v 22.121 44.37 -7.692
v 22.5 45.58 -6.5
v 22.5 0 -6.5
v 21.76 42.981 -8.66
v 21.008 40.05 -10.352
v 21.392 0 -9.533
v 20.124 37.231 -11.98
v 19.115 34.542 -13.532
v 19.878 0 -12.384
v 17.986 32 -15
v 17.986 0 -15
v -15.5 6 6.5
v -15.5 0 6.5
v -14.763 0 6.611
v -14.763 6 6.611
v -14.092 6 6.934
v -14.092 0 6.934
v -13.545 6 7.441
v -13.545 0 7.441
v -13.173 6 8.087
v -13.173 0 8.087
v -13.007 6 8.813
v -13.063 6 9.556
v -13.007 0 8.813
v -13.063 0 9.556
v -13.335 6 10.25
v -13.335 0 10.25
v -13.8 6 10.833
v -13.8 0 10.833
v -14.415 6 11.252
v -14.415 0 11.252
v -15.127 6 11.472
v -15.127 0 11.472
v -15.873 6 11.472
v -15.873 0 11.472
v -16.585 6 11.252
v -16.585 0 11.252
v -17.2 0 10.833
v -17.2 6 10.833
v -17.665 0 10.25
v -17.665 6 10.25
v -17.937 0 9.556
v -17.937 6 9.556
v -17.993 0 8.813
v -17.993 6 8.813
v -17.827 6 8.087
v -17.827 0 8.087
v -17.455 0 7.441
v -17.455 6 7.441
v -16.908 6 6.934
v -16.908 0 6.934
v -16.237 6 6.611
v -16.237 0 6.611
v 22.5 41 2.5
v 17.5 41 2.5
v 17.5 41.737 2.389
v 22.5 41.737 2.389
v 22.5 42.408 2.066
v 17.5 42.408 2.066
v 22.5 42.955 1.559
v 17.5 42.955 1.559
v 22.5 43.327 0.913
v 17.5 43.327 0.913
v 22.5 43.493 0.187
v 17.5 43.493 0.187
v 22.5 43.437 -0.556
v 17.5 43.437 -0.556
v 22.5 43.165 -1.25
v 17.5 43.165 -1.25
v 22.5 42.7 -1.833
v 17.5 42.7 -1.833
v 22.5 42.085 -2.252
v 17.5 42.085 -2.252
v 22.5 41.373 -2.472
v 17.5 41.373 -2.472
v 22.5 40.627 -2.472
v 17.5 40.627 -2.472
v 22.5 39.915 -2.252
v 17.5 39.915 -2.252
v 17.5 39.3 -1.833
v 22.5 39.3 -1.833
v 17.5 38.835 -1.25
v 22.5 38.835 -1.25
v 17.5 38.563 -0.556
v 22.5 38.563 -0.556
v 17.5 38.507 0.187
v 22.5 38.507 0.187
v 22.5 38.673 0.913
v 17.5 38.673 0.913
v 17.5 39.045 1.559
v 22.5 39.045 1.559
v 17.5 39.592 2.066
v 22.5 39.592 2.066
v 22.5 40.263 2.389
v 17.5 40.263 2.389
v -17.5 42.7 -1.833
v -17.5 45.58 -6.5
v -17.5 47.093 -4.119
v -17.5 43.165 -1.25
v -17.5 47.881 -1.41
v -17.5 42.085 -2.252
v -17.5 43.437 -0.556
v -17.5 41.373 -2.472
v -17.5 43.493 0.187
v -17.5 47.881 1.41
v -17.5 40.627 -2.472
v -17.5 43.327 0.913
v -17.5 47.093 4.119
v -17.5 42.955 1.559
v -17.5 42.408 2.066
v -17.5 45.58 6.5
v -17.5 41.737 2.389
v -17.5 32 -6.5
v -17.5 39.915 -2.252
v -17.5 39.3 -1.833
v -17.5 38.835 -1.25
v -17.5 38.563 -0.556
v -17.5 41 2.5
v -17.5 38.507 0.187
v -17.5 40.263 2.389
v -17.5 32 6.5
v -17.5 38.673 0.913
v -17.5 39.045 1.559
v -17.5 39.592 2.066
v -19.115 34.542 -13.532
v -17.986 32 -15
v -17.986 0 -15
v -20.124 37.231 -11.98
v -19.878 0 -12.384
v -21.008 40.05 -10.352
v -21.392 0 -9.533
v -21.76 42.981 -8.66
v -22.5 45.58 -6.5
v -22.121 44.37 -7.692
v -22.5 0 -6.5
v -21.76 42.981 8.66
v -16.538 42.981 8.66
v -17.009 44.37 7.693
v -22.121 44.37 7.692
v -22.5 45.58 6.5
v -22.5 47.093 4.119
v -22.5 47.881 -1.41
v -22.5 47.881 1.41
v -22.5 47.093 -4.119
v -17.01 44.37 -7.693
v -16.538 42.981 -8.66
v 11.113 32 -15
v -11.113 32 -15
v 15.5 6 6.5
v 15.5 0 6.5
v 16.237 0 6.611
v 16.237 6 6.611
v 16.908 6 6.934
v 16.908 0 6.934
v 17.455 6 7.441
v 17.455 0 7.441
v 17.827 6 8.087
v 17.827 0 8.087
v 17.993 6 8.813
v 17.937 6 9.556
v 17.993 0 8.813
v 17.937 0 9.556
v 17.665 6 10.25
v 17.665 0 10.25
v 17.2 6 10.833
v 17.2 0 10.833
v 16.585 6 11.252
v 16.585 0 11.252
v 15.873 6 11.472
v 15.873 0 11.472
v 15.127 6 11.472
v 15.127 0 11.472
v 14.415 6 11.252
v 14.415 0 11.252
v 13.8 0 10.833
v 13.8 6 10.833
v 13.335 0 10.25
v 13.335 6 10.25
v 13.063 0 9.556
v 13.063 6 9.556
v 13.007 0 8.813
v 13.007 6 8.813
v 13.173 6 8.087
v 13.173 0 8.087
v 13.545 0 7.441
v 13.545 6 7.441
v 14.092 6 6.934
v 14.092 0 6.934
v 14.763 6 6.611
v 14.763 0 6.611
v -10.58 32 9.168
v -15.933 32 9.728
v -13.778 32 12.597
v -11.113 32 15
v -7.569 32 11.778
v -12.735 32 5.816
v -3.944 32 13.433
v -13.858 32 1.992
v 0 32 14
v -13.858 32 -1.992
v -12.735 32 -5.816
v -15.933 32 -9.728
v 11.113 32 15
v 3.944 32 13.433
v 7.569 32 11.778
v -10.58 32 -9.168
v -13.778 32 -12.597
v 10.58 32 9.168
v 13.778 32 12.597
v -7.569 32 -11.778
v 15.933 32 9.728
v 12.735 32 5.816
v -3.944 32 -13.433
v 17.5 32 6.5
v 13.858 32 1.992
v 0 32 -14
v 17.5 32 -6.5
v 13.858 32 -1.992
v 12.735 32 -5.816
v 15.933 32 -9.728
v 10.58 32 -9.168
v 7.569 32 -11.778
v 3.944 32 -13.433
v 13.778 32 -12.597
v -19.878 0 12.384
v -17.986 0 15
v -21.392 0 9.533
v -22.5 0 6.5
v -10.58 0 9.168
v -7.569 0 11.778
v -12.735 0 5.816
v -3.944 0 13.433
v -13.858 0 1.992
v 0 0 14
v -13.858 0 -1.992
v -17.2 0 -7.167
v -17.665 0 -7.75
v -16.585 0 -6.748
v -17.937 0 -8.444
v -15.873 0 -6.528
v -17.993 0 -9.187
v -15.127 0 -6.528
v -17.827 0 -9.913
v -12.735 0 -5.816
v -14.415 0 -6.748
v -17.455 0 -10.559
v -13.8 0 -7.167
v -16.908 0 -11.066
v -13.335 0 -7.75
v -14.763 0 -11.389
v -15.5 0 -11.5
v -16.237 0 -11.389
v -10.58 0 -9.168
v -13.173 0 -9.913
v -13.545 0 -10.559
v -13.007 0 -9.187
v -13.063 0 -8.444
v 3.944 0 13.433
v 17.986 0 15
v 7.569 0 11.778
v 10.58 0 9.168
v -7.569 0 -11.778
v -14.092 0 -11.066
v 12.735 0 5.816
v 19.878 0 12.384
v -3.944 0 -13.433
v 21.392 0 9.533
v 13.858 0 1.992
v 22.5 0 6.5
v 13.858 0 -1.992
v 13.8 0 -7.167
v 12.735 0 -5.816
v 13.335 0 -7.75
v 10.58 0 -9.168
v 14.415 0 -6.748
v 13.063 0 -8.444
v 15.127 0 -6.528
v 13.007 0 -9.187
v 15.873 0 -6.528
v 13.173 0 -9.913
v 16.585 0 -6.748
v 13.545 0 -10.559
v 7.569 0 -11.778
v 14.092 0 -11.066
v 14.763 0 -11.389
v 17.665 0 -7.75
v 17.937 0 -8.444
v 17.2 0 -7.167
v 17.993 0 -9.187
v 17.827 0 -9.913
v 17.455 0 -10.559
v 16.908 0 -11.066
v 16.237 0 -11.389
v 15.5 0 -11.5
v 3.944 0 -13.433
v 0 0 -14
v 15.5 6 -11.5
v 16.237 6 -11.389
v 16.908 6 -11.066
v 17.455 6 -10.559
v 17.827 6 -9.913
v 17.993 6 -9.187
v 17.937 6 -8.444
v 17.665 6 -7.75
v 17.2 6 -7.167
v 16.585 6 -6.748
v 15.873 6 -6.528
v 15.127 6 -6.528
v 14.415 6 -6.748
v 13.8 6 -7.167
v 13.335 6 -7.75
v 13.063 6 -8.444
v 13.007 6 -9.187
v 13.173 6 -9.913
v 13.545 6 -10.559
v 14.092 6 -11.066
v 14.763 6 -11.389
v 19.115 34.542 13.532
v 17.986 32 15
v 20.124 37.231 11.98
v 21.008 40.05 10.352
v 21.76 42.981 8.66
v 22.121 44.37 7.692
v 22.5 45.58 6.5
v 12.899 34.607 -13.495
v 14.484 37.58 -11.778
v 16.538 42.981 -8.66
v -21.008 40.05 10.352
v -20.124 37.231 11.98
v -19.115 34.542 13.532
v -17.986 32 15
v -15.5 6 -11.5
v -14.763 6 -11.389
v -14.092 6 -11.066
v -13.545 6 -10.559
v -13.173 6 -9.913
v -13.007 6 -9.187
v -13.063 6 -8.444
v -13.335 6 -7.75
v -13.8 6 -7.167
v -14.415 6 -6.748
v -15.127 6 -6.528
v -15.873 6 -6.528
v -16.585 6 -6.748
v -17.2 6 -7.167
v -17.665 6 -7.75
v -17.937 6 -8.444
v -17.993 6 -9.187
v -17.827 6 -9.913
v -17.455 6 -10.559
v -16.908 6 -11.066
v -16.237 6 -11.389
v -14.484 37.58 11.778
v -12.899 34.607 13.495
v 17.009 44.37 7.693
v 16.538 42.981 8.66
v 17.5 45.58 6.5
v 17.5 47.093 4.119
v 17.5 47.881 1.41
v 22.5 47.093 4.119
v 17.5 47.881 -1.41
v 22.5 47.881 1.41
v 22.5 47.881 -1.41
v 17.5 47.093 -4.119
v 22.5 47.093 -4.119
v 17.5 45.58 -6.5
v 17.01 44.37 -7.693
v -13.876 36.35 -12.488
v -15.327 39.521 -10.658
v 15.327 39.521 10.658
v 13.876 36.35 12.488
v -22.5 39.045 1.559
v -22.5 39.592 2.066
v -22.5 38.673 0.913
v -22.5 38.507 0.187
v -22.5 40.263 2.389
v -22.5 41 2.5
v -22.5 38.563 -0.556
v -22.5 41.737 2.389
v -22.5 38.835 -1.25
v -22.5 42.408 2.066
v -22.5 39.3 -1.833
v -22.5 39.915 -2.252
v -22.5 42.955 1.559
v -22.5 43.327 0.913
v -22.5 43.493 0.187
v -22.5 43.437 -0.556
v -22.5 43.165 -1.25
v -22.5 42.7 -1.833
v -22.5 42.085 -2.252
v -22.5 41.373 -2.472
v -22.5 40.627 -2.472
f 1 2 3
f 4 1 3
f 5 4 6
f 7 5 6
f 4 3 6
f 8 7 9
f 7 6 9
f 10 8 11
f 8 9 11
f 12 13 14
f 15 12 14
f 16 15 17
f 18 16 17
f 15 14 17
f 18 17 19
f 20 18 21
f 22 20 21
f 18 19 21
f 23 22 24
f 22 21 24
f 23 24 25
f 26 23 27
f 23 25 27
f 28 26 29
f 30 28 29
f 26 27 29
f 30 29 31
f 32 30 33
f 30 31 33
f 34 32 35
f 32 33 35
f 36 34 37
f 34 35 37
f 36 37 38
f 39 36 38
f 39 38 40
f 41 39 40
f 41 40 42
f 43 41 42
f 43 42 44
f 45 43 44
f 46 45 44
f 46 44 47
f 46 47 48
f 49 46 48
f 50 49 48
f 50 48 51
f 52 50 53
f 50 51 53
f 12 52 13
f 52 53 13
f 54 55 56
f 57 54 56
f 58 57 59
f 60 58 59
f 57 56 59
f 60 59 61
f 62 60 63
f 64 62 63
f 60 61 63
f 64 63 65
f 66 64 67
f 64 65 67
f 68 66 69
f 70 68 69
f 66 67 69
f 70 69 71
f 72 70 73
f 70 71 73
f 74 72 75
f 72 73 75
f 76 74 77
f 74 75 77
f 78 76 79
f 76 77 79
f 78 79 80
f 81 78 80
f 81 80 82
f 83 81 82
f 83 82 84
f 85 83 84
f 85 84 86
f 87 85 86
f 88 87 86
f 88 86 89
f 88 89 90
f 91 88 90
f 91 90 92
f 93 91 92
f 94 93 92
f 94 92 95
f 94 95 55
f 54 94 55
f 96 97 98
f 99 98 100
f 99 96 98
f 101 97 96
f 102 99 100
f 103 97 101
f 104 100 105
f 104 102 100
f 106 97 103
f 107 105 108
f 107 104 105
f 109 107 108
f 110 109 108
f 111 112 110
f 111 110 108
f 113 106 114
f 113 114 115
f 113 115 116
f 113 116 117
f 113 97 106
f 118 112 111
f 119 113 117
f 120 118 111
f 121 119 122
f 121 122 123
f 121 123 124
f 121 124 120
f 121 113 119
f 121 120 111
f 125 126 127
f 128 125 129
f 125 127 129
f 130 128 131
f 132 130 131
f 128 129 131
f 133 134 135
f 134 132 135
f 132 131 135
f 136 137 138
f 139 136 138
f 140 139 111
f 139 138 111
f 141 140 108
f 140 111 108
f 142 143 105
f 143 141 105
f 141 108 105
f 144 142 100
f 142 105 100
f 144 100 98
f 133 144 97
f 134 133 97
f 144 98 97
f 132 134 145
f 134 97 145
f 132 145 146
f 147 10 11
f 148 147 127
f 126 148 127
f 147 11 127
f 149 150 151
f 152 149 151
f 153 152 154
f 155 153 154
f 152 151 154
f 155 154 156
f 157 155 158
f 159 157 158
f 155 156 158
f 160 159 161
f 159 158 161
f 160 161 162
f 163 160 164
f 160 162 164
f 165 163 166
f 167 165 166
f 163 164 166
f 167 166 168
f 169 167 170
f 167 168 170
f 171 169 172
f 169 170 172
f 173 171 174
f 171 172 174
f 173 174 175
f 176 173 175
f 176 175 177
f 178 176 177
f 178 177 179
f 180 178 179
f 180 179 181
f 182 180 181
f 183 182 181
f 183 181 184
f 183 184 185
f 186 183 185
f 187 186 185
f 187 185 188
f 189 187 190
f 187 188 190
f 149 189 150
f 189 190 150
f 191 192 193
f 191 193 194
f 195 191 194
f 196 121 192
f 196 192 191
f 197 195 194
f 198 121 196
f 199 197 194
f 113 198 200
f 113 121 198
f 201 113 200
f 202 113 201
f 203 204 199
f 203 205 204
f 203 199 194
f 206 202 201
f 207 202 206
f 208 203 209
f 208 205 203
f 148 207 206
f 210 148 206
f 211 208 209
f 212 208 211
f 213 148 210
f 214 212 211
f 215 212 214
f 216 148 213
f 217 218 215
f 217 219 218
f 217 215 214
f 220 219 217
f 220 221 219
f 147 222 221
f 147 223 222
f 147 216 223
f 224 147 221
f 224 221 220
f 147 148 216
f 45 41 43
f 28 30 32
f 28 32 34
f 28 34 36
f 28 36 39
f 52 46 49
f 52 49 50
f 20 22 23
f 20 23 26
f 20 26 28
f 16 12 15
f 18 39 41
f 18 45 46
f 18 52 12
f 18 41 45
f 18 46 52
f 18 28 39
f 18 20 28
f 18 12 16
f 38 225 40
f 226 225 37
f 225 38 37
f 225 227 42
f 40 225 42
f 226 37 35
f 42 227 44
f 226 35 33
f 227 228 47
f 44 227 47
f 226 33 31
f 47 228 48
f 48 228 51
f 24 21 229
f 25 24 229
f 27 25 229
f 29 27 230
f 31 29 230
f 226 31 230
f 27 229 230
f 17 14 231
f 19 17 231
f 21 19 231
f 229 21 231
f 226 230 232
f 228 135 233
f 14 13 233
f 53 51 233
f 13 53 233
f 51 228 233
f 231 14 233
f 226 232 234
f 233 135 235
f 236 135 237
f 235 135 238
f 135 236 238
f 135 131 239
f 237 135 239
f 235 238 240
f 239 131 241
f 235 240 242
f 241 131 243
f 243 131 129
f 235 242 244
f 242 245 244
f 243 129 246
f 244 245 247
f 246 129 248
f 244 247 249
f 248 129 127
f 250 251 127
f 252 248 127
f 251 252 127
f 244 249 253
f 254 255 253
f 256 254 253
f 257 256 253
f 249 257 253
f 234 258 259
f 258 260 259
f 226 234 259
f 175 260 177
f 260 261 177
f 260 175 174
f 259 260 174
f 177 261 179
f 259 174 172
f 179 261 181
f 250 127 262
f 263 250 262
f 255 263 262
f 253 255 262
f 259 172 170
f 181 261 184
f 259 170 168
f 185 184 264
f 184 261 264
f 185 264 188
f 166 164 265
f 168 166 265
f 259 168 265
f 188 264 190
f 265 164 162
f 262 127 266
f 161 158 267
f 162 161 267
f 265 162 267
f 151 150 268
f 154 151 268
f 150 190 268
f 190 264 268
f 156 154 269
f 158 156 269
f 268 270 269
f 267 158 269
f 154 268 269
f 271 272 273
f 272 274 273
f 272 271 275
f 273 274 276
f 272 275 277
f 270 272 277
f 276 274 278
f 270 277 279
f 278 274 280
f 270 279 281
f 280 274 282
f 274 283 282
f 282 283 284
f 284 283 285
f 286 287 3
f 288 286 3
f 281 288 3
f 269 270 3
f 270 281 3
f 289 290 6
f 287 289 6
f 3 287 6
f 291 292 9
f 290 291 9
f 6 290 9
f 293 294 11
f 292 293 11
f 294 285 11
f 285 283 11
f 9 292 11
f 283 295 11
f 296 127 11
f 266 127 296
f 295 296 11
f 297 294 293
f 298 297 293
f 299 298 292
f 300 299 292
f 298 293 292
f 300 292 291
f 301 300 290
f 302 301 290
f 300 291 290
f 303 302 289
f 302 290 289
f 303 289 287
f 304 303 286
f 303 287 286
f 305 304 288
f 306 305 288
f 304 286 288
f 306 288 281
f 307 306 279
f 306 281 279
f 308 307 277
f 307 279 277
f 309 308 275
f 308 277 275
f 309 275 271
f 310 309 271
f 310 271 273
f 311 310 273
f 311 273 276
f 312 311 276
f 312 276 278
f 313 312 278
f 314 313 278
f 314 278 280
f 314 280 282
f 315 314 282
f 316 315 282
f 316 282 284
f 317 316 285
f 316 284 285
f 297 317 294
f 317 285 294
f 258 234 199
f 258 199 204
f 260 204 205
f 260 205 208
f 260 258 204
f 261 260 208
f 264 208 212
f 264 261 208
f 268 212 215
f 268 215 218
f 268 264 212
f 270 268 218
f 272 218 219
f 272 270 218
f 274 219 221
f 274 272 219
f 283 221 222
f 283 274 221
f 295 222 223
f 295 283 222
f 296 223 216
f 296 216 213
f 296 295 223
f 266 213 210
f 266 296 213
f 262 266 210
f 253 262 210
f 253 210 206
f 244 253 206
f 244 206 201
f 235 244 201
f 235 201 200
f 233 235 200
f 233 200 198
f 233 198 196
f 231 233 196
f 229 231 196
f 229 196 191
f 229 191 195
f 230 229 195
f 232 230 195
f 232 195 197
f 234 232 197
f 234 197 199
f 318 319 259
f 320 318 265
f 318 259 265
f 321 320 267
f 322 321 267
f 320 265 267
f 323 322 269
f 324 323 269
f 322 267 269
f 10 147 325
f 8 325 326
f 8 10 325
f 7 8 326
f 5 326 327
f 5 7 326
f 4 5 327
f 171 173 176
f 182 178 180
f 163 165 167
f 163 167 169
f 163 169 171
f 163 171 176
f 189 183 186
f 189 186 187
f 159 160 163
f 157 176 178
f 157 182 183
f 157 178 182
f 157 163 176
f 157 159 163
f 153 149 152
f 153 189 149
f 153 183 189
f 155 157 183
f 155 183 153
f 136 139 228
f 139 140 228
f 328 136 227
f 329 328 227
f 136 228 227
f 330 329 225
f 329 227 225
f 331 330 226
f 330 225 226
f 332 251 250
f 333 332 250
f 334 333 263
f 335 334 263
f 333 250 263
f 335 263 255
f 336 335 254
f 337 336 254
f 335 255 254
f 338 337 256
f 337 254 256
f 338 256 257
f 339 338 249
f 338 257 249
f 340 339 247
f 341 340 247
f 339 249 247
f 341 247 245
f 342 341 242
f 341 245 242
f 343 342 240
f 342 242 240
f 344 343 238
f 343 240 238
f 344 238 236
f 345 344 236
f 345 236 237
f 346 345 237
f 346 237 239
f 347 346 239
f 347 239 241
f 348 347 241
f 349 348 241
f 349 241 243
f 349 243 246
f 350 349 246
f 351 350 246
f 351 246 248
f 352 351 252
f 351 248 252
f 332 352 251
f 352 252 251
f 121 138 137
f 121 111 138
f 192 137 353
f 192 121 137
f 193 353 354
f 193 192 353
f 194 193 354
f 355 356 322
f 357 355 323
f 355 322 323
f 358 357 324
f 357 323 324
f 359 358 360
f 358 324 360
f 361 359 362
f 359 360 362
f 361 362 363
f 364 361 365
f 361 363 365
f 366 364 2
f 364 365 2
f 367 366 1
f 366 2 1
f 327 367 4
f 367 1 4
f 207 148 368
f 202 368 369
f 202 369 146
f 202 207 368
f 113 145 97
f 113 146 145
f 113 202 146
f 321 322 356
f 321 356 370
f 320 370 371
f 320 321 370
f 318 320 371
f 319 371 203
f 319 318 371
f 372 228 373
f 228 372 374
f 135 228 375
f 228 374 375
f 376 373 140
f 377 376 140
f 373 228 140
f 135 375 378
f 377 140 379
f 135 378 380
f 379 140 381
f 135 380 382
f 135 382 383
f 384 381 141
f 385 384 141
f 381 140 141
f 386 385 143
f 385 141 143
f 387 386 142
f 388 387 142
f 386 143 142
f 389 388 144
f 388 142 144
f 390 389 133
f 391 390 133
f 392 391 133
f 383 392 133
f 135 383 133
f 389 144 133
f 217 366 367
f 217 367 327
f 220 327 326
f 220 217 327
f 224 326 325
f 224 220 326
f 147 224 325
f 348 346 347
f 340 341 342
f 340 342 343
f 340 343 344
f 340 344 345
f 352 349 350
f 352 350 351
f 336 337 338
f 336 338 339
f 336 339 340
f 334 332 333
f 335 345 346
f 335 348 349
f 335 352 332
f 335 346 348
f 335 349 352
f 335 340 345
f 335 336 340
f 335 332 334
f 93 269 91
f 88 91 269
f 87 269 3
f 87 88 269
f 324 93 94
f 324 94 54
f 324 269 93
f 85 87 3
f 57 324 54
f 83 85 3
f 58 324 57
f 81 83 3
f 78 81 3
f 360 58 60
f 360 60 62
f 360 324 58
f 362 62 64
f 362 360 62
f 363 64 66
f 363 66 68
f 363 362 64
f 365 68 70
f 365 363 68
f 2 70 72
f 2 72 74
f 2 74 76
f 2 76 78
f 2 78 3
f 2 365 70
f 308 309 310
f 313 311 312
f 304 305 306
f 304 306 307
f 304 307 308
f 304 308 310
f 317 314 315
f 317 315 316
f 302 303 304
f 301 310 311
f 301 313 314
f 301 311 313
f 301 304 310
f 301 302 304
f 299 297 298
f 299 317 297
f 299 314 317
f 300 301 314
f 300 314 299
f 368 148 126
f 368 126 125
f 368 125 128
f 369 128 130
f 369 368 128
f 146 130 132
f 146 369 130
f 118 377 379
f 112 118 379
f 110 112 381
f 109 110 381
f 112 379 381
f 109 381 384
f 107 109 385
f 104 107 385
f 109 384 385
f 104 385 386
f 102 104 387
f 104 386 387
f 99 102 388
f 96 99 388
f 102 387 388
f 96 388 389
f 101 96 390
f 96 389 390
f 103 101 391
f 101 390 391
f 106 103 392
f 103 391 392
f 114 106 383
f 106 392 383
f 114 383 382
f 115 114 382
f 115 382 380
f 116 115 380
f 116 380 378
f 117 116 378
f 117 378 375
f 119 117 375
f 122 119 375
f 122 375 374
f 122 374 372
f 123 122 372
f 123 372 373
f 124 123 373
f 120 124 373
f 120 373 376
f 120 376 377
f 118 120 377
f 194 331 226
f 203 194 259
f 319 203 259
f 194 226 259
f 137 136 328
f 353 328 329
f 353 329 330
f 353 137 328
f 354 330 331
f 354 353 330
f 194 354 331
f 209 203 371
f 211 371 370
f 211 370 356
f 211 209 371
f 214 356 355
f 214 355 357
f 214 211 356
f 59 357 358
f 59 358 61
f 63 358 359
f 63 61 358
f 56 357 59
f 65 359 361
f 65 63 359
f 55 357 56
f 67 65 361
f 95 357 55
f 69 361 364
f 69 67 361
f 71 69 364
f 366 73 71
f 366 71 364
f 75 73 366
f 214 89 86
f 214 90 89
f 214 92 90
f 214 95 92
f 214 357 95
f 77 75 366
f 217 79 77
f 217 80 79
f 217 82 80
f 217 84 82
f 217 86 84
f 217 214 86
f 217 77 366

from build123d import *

# Parameters (mm, degrees)
SKETCH1_R              = 14
BOSS_EXTRUDE1_DEPTH    = 32
BOSS_EXTRUDE2_DEPTH    = 45
SKETCH4_R              = 49.397099685
SKETCH4_R_2            = 14
CUT_EXTRUDE1_DEPTH     = 90
FILLET1_R              = 10
SKETCH6_R              = 2.5
CUT_EXTRUDE2_DEPTH     = 90
CUT_EXTRUDE3_START     = -18
CUT_EXTRUDE3_OUTLINE_R = 14
CUT_EXTRUDE3_DEPTH     = 17
SKETCH8_R              = 2.5
CUT_EXTRUDE4_DEPTH     = 6


with BuildPart() as part:
    # Sketch1 → Boss-Extrude1 (new body)
    with BuildSketch(Plane(origin=(0, 0, 0), x_dir=(1, 0, 0), z_dir=(0, 1, 0))):
        with BuildLine():
            ThreePointArc((-22.5, -6.5), (-20.684382748, -10.984366633), (-17.986105749, -15))
            Line((-17.986105749, -15), (17.986105749, -15))
            ThreePointArc((17.986105749, -15), (20.684382748, -10.984366633), (22.5, -6.5))
            Line((22.5, -6.5), (22.5, 6.5))
            ThreePointArc((22.5, 6.5), (20.684382748, 10.984366633), (17.986105749, 15))
            Line((17.986105749, 15), (-17.986105749, 15))
            ThreePointArc((-17.986105749, 15), (-20.684382748, 10.984366633), (-22.5, 6.5))
            Line((-22.5, 6.5), (-22.5, -6.5))
        make_face()
        with Locations(Location((0, 0, 0), (0, 0, 270))):
            Circle(SKETCH1_R, mode=Mode.SUBTRACT)
    extrude(amount=BOSS_EXTRUDE1_DEPTH)

    # Sketch3 → Boss-Extrude2 (add)
    with BuildSketch(Plane(origin=(22.5, 0, 0), x_dir=(0, 0, -1), z_dir=(1, 0, 0))):
        Polygon((-15, 32), (15, 32), (0, 57.980762114), align=None)
    extrude(amount=-BOSS_EXTRUDE2_DEPTH)

    # Sketch4 → Cut-Extrude1 (cut)
    # profile 1 of 2: a face of its own
    with BuildSketch(Plane.XZ):
        Circle(SKETCH4_R)
        with BuildLine():
            ThreePointArc((22.5, 6.5), (23.188916849, 3.282397806), (23.420076857, 0))
            ThreePointArc((23.420076857, 0), (23.188916849, -3.282397806), (22.5, -6.5))
            ThreePointArc((22.5, -6.5), (20.684382748, -10.984366633), (17.986105749, -15))
            ThreePointArc((17.986105749, -15), (0, -23.420076857), (-17.986105749, -15))
            ThreePointArc((-17.986105749, -15), (-20.684382748, -10.984366633), (-22.5, -6.5))
            ThreePointArc((-22.5, -6.5), (-23.420076857, 0), (-22.5, 6.5))
            ThreePointArc((-22.5, 6.5), (-20.684382748, 10.984366633), (-17.986105749, 15))
            ThreePointArc((-17.986105749, 15), (0, 23.420076857), (17.986105749, 15))
            ThreePointArc((17.986105749, 15), (20.684382748, 10.984366633), (22.5, 6.5))
        make_face(mode=Mode.SUBTRACT)
    # profile 2 of 2: a face of its own
    with BuildSketch(Plane.XZ):
        Circle(SKETCH4_R_2)
    extrude(amount=-CUT_EXTRUDE1_DEPTH, mode=Mode.SUBTRACT)

    # Fillet1
    # the kernel refuses this fillet: 10 mm, written as the material it takes off along each edge
    with BuildSketch(Plane(origin=(29.301270189, 57.980762114, 0), x_dir=(0, -0.8660254037844386, -0.5), z_dir=(-1, 0, 0)), Plane(origin=(65.801270189, 57.980762114, 0), x_dir=(0, -0.8660254037844386, -0.5), z_dir=(-1, 0, 0))) as fillet1_piece_1:
        with BuildLine():
            CenterArc((FILLET1_R * 1.73205080757, FILLET1_R), FILLET1_R, 150, 120)
            Line((FILLET1_R * 0.866025403784, FILLET1_R * 1.5), (0, 0))
            Line((0, 0), (FILLET1_R * 1.73205080757, 0))
        make_face()
    extrude(amount=95.102540378, mode=Mode.SUBTRACT)

    # Sketch6 → Cut-Extrude2 (cut)
    with BuildSketch(Plane.ZY.offset(22.5)):
        with Locations((0, 41)):
            Circle(SKETCH6_R)
    extrude(amount=-CUT_EXTRUDE2_DEPTH, mode=Mode.SUBTRACT)

    # Cut-Extrude3: read off the stored shape, not the designer's step
    # Cut-Extrude3 outline → Cut-Extrude3 (cut)
    with BuildSketch(Plane(origin=(0, 50, 0), x_dir=(1, 0, 0), z_dir=(0, 1, 0)).offset(CUT_EXTRUDE3_START)):
        with BuildLine():
            ThreePointArc((-17.5, -6.5), (-14.924450898, -11.21431074), (-11.113055385, -15))
            Line((-11.113055385, -15), (11.113055385, -15))
            ThreePointArc((11.113055385, -15), (14.924450898, -11.21431074), (17.5, -6.5))
            Line((17.5, -6.5), (17.5, 6.5))
            ThreePointArc((17.5, 6.5), (14.924450898, 11.21431074), (11.113055385, 15))
            Line((11.113055385, 15), (-11.113055385, 15))
            ThreePointArc((-11.113055385, 15), (-14.924450898, 11.21431074), (-17.5, 6.5))
            Line((-17.5, 6.5), (-17.5, -6.5))
        make_face()
        Circle(CUT_EXTRUDE3_OUTLINE_R, mode=Mode.SUBTRACT)
    extrude(amount=CUT_EXTRUDE3_DEPTH, mode=Mode.SUBTRACT)

    # Sketch8 → Cut-Extrude4 (cut)
    with BuildSketch(Plane.XZ):
        with Locations(Location((-15.5, 9, 0), (0, 0, 270))):
            Circle(SKETCH8_R)
        with Locations(Location((15.5, 9, 0), (0, 0, 270))):
            Circle(SKETCH8_R)
        with Locations(Location((15.5, -9, 0), (0, 0, 270))):
            Circle(SKETCH8_R)
        with Locations(Location((-15.5, -9, 0), (0, 0, 270))):
            Circle(SKETCH8_R)
    extrude(amount=-CUT_EXTRUDE4_DEPTH, mode=Mode.SUBTRACT)


solid = part.part
